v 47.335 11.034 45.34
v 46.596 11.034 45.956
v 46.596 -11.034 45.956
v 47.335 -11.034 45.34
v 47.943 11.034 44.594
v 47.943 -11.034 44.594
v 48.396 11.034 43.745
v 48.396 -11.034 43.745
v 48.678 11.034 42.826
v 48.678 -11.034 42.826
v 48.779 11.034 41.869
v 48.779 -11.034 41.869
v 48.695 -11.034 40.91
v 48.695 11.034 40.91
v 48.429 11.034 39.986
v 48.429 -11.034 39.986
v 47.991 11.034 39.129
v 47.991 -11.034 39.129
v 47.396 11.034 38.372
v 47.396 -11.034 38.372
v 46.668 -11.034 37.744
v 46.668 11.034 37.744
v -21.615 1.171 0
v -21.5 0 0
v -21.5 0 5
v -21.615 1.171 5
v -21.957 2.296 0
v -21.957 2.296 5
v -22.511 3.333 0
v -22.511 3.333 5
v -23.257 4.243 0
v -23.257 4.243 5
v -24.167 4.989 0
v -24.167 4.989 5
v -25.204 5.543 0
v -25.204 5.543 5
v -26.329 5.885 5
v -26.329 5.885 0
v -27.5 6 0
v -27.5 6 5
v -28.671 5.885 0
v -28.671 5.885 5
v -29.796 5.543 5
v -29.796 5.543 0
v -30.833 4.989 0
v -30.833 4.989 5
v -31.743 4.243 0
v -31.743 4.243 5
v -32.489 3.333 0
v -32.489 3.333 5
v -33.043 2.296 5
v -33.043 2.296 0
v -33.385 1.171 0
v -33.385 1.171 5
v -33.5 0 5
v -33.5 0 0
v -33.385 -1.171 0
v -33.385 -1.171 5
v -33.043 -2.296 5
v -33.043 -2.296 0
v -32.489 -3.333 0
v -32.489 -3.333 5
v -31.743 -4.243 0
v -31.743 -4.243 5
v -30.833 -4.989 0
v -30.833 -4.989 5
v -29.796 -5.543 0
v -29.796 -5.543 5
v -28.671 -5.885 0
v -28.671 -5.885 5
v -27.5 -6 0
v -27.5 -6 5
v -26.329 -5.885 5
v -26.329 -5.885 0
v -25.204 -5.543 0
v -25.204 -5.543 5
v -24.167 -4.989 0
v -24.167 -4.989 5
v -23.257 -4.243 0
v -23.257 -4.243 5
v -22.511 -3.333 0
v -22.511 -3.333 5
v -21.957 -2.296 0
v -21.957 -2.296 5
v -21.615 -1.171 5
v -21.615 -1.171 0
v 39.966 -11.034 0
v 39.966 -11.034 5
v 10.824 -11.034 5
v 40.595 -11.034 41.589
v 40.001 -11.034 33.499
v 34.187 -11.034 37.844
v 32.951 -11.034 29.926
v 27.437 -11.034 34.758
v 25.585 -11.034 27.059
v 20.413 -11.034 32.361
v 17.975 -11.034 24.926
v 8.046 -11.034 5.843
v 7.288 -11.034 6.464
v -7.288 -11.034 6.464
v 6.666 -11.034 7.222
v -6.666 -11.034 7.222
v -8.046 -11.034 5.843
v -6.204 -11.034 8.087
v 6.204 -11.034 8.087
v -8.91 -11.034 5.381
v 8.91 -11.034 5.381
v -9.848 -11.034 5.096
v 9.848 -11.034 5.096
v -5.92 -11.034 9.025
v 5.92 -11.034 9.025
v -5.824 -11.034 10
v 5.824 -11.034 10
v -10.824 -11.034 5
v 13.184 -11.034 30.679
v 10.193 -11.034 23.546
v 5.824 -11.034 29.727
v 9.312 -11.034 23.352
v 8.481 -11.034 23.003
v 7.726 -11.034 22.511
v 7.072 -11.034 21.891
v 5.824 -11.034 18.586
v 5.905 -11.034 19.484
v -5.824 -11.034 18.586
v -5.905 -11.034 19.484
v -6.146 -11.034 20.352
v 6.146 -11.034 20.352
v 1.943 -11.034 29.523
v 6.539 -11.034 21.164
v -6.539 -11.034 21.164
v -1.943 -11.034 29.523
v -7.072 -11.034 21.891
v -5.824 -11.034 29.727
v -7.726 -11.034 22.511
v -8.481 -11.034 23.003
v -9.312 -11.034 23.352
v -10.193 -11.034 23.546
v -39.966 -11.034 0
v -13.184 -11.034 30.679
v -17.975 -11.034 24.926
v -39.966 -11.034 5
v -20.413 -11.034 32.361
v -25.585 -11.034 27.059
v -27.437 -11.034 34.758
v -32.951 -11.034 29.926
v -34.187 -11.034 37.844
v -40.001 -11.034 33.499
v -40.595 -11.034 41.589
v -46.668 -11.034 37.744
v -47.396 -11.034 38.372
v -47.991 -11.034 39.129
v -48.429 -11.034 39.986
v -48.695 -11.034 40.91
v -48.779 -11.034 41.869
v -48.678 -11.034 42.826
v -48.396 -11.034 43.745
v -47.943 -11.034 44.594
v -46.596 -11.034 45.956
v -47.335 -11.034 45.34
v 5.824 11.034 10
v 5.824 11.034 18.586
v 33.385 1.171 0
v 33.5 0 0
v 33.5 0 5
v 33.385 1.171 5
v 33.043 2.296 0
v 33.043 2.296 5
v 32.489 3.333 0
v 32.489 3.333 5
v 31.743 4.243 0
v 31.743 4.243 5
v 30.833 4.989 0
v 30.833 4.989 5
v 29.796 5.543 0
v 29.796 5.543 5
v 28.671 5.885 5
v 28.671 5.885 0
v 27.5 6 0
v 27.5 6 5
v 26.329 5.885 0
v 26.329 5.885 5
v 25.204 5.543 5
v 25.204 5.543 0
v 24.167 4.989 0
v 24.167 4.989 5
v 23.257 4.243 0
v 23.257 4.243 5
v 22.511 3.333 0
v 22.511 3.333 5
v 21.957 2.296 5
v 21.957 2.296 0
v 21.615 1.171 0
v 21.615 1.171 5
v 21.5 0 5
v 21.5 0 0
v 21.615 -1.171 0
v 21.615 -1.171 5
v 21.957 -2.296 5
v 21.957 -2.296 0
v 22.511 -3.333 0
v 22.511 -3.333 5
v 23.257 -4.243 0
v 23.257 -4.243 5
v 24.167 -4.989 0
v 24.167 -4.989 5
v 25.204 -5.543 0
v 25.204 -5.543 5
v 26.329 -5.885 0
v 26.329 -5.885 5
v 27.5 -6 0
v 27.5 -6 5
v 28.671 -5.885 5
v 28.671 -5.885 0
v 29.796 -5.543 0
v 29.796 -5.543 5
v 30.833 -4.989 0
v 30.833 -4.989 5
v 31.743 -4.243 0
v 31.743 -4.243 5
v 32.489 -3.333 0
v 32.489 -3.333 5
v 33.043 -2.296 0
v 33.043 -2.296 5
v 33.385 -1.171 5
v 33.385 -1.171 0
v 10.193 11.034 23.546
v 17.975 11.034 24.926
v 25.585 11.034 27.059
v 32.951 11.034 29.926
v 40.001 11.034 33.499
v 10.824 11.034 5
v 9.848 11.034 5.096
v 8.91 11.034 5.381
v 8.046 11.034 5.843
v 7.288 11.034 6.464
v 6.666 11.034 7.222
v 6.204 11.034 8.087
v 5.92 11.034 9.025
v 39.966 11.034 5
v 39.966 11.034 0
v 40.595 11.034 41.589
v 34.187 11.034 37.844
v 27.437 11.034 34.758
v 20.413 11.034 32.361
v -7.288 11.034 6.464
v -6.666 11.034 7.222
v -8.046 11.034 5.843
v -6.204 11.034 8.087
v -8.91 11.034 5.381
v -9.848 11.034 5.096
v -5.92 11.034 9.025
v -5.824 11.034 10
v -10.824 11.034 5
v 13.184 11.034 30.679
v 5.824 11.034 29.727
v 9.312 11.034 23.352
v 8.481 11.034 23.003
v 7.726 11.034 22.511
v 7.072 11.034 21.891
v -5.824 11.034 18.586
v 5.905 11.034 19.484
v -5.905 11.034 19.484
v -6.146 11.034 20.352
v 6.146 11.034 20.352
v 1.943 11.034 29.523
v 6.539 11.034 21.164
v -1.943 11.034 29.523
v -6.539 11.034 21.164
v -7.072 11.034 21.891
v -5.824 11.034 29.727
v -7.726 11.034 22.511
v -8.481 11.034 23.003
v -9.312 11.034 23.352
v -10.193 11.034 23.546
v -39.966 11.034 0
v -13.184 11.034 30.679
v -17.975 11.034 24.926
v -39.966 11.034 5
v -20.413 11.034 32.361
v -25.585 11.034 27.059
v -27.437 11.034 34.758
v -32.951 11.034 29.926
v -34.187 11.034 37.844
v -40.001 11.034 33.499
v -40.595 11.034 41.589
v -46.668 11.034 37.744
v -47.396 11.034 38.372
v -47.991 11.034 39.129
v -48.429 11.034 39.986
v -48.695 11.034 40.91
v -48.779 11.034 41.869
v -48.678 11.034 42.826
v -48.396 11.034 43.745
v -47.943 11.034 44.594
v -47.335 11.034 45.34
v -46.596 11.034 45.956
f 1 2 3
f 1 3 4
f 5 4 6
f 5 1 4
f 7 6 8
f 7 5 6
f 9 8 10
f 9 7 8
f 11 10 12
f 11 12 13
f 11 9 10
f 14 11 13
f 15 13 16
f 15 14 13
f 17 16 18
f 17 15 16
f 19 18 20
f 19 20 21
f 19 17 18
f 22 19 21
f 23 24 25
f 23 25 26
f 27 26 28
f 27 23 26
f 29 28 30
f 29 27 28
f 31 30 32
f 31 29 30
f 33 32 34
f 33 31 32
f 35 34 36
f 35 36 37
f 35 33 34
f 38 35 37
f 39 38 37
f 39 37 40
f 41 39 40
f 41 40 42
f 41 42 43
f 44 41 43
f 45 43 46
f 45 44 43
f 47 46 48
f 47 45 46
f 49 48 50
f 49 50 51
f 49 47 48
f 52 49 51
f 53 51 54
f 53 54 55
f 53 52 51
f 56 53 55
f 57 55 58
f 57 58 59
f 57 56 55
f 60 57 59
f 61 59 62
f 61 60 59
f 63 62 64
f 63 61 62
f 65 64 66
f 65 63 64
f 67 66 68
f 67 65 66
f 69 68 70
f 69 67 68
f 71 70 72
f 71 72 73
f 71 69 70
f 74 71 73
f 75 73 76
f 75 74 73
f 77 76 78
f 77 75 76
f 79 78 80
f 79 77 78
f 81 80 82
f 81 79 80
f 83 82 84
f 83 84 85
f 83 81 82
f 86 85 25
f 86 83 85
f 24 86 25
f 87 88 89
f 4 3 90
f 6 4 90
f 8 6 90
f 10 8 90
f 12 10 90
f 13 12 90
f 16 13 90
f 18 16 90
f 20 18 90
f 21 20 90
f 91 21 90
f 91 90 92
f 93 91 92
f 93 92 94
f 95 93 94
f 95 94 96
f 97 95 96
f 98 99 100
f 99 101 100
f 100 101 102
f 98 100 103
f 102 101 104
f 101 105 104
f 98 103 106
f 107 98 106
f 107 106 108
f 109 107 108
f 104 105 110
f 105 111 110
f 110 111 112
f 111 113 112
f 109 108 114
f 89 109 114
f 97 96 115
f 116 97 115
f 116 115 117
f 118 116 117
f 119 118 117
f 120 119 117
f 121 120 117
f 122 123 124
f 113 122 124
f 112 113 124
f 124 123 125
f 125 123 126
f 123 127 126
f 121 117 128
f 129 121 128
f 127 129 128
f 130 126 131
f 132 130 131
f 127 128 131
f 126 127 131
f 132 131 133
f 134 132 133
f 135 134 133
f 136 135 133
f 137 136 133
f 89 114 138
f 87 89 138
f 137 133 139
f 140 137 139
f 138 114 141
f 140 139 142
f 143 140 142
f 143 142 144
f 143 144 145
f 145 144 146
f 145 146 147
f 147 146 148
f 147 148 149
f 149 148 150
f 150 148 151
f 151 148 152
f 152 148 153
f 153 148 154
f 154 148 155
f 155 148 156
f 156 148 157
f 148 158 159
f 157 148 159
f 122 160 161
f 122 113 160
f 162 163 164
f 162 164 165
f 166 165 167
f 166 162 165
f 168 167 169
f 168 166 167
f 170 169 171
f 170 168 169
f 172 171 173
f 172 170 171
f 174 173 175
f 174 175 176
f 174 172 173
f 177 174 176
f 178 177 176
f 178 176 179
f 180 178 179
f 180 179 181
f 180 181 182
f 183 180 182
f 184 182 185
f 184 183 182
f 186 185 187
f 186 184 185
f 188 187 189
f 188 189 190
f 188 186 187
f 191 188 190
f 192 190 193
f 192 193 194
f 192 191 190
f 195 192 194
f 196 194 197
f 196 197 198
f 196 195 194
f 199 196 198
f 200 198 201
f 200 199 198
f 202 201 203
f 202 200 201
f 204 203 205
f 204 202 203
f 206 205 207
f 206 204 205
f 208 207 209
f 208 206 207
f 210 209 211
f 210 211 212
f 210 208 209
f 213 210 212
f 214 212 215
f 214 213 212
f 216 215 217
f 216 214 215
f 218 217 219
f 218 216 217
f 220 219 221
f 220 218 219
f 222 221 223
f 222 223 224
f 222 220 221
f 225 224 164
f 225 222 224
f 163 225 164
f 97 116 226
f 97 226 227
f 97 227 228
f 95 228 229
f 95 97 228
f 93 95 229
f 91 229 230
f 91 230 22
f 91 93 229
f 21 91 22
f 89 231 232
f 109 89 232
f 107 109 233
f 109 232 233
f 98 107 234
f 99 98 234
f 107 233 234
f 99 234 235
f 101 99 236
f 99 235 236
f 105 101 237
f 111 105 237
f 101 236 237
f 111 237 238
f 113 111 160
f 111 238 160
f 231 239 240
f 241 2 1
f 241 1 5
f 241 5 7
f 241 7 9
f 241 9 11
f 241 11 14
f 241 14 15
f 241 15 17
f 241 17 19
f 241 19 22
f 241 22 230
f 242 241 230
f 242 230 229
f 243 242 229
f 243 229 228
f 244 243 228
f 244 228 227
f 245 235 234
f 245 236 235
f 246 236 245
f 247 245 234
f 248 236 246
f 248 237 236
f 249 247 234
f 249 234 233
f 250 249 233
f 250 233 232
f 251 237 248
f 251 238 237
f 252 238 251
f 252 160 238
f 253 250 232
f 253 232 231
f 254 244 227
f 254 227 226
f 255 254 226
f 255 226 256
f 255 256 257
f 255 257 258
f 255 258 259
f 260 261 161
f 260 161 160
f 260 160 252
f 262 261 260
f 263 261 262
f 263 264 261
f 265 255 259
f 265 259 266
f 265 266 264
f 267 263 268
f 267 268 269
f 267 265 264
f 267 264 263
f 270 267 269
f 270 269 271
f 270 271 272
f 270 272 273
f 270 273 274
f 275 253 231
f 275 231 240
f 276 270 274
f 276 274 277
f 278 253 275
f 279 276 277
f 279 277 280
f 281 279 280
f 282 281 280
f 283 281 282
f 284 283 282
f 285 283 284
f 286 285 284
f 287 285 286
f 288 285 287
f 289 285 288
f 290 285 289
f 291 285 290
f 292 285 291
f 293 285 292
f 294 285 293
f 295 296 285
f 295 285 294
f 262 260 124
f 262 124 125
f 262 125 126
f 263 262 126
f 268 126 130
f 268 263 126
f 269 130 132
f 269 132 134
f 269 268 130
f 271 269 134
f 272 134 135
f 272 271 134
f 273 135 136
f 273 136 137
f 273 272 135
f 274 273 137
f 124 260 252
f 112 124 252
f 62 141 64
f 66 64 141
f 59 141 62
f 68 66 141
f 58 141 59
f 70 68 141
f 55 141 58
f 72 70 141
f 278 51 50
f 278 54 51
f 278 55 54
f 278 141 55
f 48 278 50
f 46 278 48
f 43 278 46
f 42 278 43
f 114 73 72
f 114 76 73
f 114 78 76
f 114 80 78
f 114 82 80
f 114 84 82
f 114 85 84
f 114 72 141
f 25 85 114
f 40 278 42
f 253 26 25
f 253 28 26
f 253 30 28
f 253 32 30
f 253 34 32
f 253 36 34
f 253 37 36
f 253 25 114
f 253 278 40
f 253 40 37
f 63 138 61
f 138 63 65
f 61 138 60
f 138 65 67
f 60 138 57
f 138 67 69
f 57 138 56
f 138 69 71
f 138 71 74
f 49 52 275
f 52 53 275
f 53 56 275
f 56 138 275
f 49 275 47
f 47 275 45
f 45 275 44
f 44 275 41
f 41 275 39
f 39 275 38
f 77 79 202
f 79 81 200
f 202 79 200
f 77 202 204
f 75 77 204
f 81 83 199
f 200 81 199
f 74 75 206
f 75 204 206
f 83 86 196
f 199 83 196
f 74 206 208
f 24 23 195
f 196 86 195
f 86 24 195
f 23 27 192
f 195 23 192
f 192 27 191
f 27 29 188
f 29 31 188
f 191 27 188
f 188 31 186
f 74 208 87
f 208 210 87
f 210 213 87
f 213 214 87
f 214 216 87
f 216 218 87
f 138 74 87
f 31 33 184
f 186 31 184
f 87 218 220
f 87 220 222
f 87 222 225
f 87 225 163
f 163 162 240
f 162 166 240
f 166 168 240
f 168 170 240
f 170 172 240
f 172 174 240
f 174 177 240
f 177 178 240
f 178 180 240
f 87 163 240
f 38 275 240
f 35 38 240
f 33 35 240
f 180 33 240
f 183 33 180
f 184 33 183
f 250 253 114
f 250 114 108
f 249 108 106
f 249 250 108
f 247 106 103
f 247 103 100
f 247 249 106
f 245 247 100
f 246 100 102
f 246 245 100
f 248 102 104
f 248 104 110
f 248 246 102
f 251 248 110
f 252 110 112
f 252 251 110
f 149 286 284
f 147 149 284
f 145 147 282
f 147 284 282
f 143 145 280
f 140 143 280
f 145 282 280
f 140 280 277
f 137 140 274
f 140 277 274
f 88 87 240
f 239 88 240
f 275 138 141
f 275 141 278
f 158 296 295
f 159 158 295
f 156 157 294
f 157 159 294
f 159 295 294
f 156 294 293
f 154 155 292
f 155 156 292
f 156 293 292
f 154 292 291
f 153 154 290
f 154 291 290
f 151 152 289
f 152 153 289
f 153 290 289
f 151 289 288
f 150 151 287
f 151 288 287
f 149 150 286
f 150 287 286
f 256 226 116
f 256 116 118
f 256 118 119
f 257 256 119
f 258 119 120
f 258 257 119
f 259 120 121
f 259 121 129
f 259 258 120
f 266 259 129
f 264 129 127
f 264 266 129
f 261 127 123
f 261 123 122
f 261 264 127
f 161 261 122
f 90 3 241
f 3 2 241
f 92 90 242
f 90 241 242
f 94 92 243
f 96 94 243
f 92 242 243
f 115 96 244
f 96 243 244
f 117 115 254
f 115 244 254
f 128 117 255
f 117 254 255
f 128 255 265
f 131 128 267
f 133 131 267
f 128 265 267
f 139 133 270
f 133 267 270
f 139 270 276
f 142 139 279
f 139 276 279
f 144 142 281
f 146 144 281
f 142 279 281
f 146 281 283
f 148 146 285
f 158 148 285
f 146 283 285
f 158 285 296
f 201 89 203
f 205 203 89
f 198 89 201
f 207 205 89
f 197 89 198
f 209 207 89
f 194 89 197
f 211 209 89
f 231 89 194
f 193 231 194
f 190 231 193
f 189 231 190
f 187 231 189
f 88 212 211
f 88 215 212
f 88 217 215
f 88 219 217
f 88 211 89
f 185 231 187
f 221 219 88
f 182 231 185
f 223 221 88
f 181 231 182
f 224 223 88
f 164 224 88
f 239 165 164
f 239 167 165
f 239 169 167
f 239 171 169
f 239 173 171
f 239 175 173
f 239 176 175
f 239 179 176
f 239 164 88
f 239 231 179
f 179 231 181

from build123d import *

# Parameters (mm, degrees)
F0_W          = 79.9313783646
F0_H          = 22.0680292696
F0_R          = 6
F1_DEPTH      = 5
F3_DEPTH      = 11.0340146348
F3_DEPTH_BACK = 11.0340146348
F4_T1_DEPTH   = 22.0680292696
F4_T3_DEPTH   = 22.0680292696
F4_T5_DEPTH   = 22.0680292696
F4_T7_DEPTH   = 22.0680292696
F4_T9_DEPTH   = 86.1669063659
F4_T11_DEPTH  = 86.1669063659


# Not quite as in the source:
# - a fillet or chamfer that OpenCascade refuses, or shapes differently, is made with other operations: its cross-section is extruded or revolved along the edge and cut away or added


with BuildPart() as f1:
    # F0 (on Top) → F1 (new body)
    with BuildSketch(Plane.XY):
        Rectangle(F0_W, F0_H)
        with Locations((-27.5, 0)):
            Circle(F0_R, mode=Mode.SUBTRACT)
        with Locations((27.5, 0)):
            Circle(F0_R, mode=Mode.SUBTRACT)
    extrude(amount=F1_DEPTH)

    # F2 (on Front) → F3 (join, two sides)
    with BuildSketch(Plane.XZ) as f3_sk:
        with BuildLine():
            ThreePointArc((-5.8236527257, 29.7265377594), (-27.4373325166, 34.7576861994), (-46.5960713348, 45.9561832249))
            Line((-46.5960713348, 45.9561832249), (-56.5117387286, 45.9561832249))
            ThreePointArc((-56.5117387286, 45.9561832249), (-33.1949461114, 30.0355047329), (-5.8236527257, 23.1106856026))
            Line((-5.8236527257, 23.1106856026), (-5.8236527257, 29.7265377594))
        make_face()
        with BuildLine():
            ThreePointArc((5.8236527257, 29.7265377594), (0, 29.4976123348), (-5.8236527257, 29.7265377594))
            Line((-5.8236527257, 29.7265377594), (-5.8236527257, 23.1106856026))
            ThreePointArc((-5.8236527257, 23.1106856026), (0, 22.900505574), (5.8236527257, 23.1106856026))
            Line((5.8236527257, 23.1106856026), (5.8236527257, 29.7265377594))
        make_face()
        with BuildLine():
            Line((56.5117387285, 45.9561832249), (46.5960713348, 45.9561832249))
            ThreePointArc((46.5960713348, 45.9561832249), (27.4373325166, 34.7576861994), (5.8236527257, 29.7265377594))
            Line((5.8236527257, 29.7265377594), (5.8236527257, 23.1106856026))
            ThreePointArc((5.8236527257, 23.1106856026), (33.1949461114, 30.0355047329), (56.5117387285, 45.9561832249))
        make_face()
        with BuildLine():
            ThreePointArc((5.8236527257, 23.1106856026), (0, 22.900505574), (-5.8236527257, 23.1106856026))
            Line((-5.8236527257, 23.1106856026), (-5.8236527257, 0))
            Line((-5.8236527257, 0), (5.8236527257, 0))
            Line((5.8236527257, 0), (5.8236527257, 23.1106856026))
        make_face()
    extrude(amount=F3_DEPTH)
    extrude(f3_sk.sketch, amount=-F3_DEPTH_BACK)

    # F4: fillet of radius 5 on 6 edges, made by hand

    # F4_s2 → F4_t1 (join)
    with BuildSketch(Plane.XZ.offset(-11.0340146348)):
        with BuildLine():
            ThreePointArc((10.8236527257, 5), (7.2881188197, 6.4644660941), (5.8236527257, 10))
            Line((5.8236527257, 10), (5.8236527257, 5))
            Line((5.8236527257, 5), (10.8236527257, 5))
        make_face()
    extrude(amount=F4_T1_DEPTH)

    # F4_s4 → F4_t3 (join)
    with BuildSketch(Plane.XZ.offset(-11.0340146348)):
        with BuildLine():
            ThreePointArc((10.1927990317, 23.5461016937), (7.0717020017, 21.8910349005), (5.8236527257, 18.5860589906))
            Line((5.8236527257, 18.5860589906), (5.8236527257, 23.1106856026))
            ThreePointArc((5.8236527257, 23.1106856026), (8.0111845889, 23.2987047184), (10.1927990317, 23.5461016937))
        make_face()
    extrude(amount=F4_T3_DEPTH)

    # F4_s6 → F4_t5 (join)
    with BuildSketch(Plane.XZ.offset(-11.0340146348)):
        with BuildLine():
            ThreePointArc((-5.8236527257, 18.5860589906), (-7.0717020017, 21.8910349005), (-10.1927990317, 23.5461016937))
            ThreePointArc((-10.1927990317, 23.5461016937), (-8.0111845889, 23.2987047184), (-5.8236527257, 23.1106856026))
            Line((-5.8236527257, 23.1106856026), (-5.8236527257, 18.5860589906))
        make_face()
    extrude(amount=F4_T5_DEPTH)

    # F4_s8 → F4_t7 (join)
    with BuildSketch(Plane.XZ.offset(-11.0340146348)):
        with BuildLine():
            ThreePointArc((-10.8236527257, 5), (-7.2881188197, 6.4644660941), (-5.8236527257, 10))
            Line((-5.8236527257, 10), (-5.8236527257, 5))
            Line((-5.8236527257, 5), (-10.8236527257, 5))
        make_face()
    extrude(amount=F4_T7_DEPTH)

    # F4_s10 → F4_t9 (cut)
    with BuildSketch(Plane.XZ.offset(-43.083453183)):
        with BuildLine():
            ThreePointArc((46.5960713348, 45.9561832249), (48.7794064532, 41.8686786406), (46.6679769916, 37.743571176))
            ThreePointArc((46.6679769916, 37.743571176), (51.7530210054, 41.6543073723), (56.5117387285, 45.9561832249))
            Line((56.5117387285, 45.9561832249), (46.5960713348, 45.9561832249))
        make_face()
    extrude(amount=F4_T9_DEPTH, mode=Mode.SUBTRACT)

    # F4_s12 → F4_t11 (cut)
    with BuildSketch(Plane.XZ.offset(-43.083453183)):
        with BuildLine():
            ThreePointArc((-46.5960713348, 45.9561832249), (-48.7794064532, 41.8686786406), (-46.6679769916, 37.743571176))
            ThreePointArc((-46.6679769916, 37.743571176), (-51.7530210054, 41.6543073723), (-56.5117387286, 45.9561832249))
            Line((-56.5117387286, 45.9561832249), (-46.5960713348, 45.9561832249))
        make_face()
    extrude(amount=F4_T11_DEPTH, mode=Mode.SUBTRACT)


solid = f1.part
